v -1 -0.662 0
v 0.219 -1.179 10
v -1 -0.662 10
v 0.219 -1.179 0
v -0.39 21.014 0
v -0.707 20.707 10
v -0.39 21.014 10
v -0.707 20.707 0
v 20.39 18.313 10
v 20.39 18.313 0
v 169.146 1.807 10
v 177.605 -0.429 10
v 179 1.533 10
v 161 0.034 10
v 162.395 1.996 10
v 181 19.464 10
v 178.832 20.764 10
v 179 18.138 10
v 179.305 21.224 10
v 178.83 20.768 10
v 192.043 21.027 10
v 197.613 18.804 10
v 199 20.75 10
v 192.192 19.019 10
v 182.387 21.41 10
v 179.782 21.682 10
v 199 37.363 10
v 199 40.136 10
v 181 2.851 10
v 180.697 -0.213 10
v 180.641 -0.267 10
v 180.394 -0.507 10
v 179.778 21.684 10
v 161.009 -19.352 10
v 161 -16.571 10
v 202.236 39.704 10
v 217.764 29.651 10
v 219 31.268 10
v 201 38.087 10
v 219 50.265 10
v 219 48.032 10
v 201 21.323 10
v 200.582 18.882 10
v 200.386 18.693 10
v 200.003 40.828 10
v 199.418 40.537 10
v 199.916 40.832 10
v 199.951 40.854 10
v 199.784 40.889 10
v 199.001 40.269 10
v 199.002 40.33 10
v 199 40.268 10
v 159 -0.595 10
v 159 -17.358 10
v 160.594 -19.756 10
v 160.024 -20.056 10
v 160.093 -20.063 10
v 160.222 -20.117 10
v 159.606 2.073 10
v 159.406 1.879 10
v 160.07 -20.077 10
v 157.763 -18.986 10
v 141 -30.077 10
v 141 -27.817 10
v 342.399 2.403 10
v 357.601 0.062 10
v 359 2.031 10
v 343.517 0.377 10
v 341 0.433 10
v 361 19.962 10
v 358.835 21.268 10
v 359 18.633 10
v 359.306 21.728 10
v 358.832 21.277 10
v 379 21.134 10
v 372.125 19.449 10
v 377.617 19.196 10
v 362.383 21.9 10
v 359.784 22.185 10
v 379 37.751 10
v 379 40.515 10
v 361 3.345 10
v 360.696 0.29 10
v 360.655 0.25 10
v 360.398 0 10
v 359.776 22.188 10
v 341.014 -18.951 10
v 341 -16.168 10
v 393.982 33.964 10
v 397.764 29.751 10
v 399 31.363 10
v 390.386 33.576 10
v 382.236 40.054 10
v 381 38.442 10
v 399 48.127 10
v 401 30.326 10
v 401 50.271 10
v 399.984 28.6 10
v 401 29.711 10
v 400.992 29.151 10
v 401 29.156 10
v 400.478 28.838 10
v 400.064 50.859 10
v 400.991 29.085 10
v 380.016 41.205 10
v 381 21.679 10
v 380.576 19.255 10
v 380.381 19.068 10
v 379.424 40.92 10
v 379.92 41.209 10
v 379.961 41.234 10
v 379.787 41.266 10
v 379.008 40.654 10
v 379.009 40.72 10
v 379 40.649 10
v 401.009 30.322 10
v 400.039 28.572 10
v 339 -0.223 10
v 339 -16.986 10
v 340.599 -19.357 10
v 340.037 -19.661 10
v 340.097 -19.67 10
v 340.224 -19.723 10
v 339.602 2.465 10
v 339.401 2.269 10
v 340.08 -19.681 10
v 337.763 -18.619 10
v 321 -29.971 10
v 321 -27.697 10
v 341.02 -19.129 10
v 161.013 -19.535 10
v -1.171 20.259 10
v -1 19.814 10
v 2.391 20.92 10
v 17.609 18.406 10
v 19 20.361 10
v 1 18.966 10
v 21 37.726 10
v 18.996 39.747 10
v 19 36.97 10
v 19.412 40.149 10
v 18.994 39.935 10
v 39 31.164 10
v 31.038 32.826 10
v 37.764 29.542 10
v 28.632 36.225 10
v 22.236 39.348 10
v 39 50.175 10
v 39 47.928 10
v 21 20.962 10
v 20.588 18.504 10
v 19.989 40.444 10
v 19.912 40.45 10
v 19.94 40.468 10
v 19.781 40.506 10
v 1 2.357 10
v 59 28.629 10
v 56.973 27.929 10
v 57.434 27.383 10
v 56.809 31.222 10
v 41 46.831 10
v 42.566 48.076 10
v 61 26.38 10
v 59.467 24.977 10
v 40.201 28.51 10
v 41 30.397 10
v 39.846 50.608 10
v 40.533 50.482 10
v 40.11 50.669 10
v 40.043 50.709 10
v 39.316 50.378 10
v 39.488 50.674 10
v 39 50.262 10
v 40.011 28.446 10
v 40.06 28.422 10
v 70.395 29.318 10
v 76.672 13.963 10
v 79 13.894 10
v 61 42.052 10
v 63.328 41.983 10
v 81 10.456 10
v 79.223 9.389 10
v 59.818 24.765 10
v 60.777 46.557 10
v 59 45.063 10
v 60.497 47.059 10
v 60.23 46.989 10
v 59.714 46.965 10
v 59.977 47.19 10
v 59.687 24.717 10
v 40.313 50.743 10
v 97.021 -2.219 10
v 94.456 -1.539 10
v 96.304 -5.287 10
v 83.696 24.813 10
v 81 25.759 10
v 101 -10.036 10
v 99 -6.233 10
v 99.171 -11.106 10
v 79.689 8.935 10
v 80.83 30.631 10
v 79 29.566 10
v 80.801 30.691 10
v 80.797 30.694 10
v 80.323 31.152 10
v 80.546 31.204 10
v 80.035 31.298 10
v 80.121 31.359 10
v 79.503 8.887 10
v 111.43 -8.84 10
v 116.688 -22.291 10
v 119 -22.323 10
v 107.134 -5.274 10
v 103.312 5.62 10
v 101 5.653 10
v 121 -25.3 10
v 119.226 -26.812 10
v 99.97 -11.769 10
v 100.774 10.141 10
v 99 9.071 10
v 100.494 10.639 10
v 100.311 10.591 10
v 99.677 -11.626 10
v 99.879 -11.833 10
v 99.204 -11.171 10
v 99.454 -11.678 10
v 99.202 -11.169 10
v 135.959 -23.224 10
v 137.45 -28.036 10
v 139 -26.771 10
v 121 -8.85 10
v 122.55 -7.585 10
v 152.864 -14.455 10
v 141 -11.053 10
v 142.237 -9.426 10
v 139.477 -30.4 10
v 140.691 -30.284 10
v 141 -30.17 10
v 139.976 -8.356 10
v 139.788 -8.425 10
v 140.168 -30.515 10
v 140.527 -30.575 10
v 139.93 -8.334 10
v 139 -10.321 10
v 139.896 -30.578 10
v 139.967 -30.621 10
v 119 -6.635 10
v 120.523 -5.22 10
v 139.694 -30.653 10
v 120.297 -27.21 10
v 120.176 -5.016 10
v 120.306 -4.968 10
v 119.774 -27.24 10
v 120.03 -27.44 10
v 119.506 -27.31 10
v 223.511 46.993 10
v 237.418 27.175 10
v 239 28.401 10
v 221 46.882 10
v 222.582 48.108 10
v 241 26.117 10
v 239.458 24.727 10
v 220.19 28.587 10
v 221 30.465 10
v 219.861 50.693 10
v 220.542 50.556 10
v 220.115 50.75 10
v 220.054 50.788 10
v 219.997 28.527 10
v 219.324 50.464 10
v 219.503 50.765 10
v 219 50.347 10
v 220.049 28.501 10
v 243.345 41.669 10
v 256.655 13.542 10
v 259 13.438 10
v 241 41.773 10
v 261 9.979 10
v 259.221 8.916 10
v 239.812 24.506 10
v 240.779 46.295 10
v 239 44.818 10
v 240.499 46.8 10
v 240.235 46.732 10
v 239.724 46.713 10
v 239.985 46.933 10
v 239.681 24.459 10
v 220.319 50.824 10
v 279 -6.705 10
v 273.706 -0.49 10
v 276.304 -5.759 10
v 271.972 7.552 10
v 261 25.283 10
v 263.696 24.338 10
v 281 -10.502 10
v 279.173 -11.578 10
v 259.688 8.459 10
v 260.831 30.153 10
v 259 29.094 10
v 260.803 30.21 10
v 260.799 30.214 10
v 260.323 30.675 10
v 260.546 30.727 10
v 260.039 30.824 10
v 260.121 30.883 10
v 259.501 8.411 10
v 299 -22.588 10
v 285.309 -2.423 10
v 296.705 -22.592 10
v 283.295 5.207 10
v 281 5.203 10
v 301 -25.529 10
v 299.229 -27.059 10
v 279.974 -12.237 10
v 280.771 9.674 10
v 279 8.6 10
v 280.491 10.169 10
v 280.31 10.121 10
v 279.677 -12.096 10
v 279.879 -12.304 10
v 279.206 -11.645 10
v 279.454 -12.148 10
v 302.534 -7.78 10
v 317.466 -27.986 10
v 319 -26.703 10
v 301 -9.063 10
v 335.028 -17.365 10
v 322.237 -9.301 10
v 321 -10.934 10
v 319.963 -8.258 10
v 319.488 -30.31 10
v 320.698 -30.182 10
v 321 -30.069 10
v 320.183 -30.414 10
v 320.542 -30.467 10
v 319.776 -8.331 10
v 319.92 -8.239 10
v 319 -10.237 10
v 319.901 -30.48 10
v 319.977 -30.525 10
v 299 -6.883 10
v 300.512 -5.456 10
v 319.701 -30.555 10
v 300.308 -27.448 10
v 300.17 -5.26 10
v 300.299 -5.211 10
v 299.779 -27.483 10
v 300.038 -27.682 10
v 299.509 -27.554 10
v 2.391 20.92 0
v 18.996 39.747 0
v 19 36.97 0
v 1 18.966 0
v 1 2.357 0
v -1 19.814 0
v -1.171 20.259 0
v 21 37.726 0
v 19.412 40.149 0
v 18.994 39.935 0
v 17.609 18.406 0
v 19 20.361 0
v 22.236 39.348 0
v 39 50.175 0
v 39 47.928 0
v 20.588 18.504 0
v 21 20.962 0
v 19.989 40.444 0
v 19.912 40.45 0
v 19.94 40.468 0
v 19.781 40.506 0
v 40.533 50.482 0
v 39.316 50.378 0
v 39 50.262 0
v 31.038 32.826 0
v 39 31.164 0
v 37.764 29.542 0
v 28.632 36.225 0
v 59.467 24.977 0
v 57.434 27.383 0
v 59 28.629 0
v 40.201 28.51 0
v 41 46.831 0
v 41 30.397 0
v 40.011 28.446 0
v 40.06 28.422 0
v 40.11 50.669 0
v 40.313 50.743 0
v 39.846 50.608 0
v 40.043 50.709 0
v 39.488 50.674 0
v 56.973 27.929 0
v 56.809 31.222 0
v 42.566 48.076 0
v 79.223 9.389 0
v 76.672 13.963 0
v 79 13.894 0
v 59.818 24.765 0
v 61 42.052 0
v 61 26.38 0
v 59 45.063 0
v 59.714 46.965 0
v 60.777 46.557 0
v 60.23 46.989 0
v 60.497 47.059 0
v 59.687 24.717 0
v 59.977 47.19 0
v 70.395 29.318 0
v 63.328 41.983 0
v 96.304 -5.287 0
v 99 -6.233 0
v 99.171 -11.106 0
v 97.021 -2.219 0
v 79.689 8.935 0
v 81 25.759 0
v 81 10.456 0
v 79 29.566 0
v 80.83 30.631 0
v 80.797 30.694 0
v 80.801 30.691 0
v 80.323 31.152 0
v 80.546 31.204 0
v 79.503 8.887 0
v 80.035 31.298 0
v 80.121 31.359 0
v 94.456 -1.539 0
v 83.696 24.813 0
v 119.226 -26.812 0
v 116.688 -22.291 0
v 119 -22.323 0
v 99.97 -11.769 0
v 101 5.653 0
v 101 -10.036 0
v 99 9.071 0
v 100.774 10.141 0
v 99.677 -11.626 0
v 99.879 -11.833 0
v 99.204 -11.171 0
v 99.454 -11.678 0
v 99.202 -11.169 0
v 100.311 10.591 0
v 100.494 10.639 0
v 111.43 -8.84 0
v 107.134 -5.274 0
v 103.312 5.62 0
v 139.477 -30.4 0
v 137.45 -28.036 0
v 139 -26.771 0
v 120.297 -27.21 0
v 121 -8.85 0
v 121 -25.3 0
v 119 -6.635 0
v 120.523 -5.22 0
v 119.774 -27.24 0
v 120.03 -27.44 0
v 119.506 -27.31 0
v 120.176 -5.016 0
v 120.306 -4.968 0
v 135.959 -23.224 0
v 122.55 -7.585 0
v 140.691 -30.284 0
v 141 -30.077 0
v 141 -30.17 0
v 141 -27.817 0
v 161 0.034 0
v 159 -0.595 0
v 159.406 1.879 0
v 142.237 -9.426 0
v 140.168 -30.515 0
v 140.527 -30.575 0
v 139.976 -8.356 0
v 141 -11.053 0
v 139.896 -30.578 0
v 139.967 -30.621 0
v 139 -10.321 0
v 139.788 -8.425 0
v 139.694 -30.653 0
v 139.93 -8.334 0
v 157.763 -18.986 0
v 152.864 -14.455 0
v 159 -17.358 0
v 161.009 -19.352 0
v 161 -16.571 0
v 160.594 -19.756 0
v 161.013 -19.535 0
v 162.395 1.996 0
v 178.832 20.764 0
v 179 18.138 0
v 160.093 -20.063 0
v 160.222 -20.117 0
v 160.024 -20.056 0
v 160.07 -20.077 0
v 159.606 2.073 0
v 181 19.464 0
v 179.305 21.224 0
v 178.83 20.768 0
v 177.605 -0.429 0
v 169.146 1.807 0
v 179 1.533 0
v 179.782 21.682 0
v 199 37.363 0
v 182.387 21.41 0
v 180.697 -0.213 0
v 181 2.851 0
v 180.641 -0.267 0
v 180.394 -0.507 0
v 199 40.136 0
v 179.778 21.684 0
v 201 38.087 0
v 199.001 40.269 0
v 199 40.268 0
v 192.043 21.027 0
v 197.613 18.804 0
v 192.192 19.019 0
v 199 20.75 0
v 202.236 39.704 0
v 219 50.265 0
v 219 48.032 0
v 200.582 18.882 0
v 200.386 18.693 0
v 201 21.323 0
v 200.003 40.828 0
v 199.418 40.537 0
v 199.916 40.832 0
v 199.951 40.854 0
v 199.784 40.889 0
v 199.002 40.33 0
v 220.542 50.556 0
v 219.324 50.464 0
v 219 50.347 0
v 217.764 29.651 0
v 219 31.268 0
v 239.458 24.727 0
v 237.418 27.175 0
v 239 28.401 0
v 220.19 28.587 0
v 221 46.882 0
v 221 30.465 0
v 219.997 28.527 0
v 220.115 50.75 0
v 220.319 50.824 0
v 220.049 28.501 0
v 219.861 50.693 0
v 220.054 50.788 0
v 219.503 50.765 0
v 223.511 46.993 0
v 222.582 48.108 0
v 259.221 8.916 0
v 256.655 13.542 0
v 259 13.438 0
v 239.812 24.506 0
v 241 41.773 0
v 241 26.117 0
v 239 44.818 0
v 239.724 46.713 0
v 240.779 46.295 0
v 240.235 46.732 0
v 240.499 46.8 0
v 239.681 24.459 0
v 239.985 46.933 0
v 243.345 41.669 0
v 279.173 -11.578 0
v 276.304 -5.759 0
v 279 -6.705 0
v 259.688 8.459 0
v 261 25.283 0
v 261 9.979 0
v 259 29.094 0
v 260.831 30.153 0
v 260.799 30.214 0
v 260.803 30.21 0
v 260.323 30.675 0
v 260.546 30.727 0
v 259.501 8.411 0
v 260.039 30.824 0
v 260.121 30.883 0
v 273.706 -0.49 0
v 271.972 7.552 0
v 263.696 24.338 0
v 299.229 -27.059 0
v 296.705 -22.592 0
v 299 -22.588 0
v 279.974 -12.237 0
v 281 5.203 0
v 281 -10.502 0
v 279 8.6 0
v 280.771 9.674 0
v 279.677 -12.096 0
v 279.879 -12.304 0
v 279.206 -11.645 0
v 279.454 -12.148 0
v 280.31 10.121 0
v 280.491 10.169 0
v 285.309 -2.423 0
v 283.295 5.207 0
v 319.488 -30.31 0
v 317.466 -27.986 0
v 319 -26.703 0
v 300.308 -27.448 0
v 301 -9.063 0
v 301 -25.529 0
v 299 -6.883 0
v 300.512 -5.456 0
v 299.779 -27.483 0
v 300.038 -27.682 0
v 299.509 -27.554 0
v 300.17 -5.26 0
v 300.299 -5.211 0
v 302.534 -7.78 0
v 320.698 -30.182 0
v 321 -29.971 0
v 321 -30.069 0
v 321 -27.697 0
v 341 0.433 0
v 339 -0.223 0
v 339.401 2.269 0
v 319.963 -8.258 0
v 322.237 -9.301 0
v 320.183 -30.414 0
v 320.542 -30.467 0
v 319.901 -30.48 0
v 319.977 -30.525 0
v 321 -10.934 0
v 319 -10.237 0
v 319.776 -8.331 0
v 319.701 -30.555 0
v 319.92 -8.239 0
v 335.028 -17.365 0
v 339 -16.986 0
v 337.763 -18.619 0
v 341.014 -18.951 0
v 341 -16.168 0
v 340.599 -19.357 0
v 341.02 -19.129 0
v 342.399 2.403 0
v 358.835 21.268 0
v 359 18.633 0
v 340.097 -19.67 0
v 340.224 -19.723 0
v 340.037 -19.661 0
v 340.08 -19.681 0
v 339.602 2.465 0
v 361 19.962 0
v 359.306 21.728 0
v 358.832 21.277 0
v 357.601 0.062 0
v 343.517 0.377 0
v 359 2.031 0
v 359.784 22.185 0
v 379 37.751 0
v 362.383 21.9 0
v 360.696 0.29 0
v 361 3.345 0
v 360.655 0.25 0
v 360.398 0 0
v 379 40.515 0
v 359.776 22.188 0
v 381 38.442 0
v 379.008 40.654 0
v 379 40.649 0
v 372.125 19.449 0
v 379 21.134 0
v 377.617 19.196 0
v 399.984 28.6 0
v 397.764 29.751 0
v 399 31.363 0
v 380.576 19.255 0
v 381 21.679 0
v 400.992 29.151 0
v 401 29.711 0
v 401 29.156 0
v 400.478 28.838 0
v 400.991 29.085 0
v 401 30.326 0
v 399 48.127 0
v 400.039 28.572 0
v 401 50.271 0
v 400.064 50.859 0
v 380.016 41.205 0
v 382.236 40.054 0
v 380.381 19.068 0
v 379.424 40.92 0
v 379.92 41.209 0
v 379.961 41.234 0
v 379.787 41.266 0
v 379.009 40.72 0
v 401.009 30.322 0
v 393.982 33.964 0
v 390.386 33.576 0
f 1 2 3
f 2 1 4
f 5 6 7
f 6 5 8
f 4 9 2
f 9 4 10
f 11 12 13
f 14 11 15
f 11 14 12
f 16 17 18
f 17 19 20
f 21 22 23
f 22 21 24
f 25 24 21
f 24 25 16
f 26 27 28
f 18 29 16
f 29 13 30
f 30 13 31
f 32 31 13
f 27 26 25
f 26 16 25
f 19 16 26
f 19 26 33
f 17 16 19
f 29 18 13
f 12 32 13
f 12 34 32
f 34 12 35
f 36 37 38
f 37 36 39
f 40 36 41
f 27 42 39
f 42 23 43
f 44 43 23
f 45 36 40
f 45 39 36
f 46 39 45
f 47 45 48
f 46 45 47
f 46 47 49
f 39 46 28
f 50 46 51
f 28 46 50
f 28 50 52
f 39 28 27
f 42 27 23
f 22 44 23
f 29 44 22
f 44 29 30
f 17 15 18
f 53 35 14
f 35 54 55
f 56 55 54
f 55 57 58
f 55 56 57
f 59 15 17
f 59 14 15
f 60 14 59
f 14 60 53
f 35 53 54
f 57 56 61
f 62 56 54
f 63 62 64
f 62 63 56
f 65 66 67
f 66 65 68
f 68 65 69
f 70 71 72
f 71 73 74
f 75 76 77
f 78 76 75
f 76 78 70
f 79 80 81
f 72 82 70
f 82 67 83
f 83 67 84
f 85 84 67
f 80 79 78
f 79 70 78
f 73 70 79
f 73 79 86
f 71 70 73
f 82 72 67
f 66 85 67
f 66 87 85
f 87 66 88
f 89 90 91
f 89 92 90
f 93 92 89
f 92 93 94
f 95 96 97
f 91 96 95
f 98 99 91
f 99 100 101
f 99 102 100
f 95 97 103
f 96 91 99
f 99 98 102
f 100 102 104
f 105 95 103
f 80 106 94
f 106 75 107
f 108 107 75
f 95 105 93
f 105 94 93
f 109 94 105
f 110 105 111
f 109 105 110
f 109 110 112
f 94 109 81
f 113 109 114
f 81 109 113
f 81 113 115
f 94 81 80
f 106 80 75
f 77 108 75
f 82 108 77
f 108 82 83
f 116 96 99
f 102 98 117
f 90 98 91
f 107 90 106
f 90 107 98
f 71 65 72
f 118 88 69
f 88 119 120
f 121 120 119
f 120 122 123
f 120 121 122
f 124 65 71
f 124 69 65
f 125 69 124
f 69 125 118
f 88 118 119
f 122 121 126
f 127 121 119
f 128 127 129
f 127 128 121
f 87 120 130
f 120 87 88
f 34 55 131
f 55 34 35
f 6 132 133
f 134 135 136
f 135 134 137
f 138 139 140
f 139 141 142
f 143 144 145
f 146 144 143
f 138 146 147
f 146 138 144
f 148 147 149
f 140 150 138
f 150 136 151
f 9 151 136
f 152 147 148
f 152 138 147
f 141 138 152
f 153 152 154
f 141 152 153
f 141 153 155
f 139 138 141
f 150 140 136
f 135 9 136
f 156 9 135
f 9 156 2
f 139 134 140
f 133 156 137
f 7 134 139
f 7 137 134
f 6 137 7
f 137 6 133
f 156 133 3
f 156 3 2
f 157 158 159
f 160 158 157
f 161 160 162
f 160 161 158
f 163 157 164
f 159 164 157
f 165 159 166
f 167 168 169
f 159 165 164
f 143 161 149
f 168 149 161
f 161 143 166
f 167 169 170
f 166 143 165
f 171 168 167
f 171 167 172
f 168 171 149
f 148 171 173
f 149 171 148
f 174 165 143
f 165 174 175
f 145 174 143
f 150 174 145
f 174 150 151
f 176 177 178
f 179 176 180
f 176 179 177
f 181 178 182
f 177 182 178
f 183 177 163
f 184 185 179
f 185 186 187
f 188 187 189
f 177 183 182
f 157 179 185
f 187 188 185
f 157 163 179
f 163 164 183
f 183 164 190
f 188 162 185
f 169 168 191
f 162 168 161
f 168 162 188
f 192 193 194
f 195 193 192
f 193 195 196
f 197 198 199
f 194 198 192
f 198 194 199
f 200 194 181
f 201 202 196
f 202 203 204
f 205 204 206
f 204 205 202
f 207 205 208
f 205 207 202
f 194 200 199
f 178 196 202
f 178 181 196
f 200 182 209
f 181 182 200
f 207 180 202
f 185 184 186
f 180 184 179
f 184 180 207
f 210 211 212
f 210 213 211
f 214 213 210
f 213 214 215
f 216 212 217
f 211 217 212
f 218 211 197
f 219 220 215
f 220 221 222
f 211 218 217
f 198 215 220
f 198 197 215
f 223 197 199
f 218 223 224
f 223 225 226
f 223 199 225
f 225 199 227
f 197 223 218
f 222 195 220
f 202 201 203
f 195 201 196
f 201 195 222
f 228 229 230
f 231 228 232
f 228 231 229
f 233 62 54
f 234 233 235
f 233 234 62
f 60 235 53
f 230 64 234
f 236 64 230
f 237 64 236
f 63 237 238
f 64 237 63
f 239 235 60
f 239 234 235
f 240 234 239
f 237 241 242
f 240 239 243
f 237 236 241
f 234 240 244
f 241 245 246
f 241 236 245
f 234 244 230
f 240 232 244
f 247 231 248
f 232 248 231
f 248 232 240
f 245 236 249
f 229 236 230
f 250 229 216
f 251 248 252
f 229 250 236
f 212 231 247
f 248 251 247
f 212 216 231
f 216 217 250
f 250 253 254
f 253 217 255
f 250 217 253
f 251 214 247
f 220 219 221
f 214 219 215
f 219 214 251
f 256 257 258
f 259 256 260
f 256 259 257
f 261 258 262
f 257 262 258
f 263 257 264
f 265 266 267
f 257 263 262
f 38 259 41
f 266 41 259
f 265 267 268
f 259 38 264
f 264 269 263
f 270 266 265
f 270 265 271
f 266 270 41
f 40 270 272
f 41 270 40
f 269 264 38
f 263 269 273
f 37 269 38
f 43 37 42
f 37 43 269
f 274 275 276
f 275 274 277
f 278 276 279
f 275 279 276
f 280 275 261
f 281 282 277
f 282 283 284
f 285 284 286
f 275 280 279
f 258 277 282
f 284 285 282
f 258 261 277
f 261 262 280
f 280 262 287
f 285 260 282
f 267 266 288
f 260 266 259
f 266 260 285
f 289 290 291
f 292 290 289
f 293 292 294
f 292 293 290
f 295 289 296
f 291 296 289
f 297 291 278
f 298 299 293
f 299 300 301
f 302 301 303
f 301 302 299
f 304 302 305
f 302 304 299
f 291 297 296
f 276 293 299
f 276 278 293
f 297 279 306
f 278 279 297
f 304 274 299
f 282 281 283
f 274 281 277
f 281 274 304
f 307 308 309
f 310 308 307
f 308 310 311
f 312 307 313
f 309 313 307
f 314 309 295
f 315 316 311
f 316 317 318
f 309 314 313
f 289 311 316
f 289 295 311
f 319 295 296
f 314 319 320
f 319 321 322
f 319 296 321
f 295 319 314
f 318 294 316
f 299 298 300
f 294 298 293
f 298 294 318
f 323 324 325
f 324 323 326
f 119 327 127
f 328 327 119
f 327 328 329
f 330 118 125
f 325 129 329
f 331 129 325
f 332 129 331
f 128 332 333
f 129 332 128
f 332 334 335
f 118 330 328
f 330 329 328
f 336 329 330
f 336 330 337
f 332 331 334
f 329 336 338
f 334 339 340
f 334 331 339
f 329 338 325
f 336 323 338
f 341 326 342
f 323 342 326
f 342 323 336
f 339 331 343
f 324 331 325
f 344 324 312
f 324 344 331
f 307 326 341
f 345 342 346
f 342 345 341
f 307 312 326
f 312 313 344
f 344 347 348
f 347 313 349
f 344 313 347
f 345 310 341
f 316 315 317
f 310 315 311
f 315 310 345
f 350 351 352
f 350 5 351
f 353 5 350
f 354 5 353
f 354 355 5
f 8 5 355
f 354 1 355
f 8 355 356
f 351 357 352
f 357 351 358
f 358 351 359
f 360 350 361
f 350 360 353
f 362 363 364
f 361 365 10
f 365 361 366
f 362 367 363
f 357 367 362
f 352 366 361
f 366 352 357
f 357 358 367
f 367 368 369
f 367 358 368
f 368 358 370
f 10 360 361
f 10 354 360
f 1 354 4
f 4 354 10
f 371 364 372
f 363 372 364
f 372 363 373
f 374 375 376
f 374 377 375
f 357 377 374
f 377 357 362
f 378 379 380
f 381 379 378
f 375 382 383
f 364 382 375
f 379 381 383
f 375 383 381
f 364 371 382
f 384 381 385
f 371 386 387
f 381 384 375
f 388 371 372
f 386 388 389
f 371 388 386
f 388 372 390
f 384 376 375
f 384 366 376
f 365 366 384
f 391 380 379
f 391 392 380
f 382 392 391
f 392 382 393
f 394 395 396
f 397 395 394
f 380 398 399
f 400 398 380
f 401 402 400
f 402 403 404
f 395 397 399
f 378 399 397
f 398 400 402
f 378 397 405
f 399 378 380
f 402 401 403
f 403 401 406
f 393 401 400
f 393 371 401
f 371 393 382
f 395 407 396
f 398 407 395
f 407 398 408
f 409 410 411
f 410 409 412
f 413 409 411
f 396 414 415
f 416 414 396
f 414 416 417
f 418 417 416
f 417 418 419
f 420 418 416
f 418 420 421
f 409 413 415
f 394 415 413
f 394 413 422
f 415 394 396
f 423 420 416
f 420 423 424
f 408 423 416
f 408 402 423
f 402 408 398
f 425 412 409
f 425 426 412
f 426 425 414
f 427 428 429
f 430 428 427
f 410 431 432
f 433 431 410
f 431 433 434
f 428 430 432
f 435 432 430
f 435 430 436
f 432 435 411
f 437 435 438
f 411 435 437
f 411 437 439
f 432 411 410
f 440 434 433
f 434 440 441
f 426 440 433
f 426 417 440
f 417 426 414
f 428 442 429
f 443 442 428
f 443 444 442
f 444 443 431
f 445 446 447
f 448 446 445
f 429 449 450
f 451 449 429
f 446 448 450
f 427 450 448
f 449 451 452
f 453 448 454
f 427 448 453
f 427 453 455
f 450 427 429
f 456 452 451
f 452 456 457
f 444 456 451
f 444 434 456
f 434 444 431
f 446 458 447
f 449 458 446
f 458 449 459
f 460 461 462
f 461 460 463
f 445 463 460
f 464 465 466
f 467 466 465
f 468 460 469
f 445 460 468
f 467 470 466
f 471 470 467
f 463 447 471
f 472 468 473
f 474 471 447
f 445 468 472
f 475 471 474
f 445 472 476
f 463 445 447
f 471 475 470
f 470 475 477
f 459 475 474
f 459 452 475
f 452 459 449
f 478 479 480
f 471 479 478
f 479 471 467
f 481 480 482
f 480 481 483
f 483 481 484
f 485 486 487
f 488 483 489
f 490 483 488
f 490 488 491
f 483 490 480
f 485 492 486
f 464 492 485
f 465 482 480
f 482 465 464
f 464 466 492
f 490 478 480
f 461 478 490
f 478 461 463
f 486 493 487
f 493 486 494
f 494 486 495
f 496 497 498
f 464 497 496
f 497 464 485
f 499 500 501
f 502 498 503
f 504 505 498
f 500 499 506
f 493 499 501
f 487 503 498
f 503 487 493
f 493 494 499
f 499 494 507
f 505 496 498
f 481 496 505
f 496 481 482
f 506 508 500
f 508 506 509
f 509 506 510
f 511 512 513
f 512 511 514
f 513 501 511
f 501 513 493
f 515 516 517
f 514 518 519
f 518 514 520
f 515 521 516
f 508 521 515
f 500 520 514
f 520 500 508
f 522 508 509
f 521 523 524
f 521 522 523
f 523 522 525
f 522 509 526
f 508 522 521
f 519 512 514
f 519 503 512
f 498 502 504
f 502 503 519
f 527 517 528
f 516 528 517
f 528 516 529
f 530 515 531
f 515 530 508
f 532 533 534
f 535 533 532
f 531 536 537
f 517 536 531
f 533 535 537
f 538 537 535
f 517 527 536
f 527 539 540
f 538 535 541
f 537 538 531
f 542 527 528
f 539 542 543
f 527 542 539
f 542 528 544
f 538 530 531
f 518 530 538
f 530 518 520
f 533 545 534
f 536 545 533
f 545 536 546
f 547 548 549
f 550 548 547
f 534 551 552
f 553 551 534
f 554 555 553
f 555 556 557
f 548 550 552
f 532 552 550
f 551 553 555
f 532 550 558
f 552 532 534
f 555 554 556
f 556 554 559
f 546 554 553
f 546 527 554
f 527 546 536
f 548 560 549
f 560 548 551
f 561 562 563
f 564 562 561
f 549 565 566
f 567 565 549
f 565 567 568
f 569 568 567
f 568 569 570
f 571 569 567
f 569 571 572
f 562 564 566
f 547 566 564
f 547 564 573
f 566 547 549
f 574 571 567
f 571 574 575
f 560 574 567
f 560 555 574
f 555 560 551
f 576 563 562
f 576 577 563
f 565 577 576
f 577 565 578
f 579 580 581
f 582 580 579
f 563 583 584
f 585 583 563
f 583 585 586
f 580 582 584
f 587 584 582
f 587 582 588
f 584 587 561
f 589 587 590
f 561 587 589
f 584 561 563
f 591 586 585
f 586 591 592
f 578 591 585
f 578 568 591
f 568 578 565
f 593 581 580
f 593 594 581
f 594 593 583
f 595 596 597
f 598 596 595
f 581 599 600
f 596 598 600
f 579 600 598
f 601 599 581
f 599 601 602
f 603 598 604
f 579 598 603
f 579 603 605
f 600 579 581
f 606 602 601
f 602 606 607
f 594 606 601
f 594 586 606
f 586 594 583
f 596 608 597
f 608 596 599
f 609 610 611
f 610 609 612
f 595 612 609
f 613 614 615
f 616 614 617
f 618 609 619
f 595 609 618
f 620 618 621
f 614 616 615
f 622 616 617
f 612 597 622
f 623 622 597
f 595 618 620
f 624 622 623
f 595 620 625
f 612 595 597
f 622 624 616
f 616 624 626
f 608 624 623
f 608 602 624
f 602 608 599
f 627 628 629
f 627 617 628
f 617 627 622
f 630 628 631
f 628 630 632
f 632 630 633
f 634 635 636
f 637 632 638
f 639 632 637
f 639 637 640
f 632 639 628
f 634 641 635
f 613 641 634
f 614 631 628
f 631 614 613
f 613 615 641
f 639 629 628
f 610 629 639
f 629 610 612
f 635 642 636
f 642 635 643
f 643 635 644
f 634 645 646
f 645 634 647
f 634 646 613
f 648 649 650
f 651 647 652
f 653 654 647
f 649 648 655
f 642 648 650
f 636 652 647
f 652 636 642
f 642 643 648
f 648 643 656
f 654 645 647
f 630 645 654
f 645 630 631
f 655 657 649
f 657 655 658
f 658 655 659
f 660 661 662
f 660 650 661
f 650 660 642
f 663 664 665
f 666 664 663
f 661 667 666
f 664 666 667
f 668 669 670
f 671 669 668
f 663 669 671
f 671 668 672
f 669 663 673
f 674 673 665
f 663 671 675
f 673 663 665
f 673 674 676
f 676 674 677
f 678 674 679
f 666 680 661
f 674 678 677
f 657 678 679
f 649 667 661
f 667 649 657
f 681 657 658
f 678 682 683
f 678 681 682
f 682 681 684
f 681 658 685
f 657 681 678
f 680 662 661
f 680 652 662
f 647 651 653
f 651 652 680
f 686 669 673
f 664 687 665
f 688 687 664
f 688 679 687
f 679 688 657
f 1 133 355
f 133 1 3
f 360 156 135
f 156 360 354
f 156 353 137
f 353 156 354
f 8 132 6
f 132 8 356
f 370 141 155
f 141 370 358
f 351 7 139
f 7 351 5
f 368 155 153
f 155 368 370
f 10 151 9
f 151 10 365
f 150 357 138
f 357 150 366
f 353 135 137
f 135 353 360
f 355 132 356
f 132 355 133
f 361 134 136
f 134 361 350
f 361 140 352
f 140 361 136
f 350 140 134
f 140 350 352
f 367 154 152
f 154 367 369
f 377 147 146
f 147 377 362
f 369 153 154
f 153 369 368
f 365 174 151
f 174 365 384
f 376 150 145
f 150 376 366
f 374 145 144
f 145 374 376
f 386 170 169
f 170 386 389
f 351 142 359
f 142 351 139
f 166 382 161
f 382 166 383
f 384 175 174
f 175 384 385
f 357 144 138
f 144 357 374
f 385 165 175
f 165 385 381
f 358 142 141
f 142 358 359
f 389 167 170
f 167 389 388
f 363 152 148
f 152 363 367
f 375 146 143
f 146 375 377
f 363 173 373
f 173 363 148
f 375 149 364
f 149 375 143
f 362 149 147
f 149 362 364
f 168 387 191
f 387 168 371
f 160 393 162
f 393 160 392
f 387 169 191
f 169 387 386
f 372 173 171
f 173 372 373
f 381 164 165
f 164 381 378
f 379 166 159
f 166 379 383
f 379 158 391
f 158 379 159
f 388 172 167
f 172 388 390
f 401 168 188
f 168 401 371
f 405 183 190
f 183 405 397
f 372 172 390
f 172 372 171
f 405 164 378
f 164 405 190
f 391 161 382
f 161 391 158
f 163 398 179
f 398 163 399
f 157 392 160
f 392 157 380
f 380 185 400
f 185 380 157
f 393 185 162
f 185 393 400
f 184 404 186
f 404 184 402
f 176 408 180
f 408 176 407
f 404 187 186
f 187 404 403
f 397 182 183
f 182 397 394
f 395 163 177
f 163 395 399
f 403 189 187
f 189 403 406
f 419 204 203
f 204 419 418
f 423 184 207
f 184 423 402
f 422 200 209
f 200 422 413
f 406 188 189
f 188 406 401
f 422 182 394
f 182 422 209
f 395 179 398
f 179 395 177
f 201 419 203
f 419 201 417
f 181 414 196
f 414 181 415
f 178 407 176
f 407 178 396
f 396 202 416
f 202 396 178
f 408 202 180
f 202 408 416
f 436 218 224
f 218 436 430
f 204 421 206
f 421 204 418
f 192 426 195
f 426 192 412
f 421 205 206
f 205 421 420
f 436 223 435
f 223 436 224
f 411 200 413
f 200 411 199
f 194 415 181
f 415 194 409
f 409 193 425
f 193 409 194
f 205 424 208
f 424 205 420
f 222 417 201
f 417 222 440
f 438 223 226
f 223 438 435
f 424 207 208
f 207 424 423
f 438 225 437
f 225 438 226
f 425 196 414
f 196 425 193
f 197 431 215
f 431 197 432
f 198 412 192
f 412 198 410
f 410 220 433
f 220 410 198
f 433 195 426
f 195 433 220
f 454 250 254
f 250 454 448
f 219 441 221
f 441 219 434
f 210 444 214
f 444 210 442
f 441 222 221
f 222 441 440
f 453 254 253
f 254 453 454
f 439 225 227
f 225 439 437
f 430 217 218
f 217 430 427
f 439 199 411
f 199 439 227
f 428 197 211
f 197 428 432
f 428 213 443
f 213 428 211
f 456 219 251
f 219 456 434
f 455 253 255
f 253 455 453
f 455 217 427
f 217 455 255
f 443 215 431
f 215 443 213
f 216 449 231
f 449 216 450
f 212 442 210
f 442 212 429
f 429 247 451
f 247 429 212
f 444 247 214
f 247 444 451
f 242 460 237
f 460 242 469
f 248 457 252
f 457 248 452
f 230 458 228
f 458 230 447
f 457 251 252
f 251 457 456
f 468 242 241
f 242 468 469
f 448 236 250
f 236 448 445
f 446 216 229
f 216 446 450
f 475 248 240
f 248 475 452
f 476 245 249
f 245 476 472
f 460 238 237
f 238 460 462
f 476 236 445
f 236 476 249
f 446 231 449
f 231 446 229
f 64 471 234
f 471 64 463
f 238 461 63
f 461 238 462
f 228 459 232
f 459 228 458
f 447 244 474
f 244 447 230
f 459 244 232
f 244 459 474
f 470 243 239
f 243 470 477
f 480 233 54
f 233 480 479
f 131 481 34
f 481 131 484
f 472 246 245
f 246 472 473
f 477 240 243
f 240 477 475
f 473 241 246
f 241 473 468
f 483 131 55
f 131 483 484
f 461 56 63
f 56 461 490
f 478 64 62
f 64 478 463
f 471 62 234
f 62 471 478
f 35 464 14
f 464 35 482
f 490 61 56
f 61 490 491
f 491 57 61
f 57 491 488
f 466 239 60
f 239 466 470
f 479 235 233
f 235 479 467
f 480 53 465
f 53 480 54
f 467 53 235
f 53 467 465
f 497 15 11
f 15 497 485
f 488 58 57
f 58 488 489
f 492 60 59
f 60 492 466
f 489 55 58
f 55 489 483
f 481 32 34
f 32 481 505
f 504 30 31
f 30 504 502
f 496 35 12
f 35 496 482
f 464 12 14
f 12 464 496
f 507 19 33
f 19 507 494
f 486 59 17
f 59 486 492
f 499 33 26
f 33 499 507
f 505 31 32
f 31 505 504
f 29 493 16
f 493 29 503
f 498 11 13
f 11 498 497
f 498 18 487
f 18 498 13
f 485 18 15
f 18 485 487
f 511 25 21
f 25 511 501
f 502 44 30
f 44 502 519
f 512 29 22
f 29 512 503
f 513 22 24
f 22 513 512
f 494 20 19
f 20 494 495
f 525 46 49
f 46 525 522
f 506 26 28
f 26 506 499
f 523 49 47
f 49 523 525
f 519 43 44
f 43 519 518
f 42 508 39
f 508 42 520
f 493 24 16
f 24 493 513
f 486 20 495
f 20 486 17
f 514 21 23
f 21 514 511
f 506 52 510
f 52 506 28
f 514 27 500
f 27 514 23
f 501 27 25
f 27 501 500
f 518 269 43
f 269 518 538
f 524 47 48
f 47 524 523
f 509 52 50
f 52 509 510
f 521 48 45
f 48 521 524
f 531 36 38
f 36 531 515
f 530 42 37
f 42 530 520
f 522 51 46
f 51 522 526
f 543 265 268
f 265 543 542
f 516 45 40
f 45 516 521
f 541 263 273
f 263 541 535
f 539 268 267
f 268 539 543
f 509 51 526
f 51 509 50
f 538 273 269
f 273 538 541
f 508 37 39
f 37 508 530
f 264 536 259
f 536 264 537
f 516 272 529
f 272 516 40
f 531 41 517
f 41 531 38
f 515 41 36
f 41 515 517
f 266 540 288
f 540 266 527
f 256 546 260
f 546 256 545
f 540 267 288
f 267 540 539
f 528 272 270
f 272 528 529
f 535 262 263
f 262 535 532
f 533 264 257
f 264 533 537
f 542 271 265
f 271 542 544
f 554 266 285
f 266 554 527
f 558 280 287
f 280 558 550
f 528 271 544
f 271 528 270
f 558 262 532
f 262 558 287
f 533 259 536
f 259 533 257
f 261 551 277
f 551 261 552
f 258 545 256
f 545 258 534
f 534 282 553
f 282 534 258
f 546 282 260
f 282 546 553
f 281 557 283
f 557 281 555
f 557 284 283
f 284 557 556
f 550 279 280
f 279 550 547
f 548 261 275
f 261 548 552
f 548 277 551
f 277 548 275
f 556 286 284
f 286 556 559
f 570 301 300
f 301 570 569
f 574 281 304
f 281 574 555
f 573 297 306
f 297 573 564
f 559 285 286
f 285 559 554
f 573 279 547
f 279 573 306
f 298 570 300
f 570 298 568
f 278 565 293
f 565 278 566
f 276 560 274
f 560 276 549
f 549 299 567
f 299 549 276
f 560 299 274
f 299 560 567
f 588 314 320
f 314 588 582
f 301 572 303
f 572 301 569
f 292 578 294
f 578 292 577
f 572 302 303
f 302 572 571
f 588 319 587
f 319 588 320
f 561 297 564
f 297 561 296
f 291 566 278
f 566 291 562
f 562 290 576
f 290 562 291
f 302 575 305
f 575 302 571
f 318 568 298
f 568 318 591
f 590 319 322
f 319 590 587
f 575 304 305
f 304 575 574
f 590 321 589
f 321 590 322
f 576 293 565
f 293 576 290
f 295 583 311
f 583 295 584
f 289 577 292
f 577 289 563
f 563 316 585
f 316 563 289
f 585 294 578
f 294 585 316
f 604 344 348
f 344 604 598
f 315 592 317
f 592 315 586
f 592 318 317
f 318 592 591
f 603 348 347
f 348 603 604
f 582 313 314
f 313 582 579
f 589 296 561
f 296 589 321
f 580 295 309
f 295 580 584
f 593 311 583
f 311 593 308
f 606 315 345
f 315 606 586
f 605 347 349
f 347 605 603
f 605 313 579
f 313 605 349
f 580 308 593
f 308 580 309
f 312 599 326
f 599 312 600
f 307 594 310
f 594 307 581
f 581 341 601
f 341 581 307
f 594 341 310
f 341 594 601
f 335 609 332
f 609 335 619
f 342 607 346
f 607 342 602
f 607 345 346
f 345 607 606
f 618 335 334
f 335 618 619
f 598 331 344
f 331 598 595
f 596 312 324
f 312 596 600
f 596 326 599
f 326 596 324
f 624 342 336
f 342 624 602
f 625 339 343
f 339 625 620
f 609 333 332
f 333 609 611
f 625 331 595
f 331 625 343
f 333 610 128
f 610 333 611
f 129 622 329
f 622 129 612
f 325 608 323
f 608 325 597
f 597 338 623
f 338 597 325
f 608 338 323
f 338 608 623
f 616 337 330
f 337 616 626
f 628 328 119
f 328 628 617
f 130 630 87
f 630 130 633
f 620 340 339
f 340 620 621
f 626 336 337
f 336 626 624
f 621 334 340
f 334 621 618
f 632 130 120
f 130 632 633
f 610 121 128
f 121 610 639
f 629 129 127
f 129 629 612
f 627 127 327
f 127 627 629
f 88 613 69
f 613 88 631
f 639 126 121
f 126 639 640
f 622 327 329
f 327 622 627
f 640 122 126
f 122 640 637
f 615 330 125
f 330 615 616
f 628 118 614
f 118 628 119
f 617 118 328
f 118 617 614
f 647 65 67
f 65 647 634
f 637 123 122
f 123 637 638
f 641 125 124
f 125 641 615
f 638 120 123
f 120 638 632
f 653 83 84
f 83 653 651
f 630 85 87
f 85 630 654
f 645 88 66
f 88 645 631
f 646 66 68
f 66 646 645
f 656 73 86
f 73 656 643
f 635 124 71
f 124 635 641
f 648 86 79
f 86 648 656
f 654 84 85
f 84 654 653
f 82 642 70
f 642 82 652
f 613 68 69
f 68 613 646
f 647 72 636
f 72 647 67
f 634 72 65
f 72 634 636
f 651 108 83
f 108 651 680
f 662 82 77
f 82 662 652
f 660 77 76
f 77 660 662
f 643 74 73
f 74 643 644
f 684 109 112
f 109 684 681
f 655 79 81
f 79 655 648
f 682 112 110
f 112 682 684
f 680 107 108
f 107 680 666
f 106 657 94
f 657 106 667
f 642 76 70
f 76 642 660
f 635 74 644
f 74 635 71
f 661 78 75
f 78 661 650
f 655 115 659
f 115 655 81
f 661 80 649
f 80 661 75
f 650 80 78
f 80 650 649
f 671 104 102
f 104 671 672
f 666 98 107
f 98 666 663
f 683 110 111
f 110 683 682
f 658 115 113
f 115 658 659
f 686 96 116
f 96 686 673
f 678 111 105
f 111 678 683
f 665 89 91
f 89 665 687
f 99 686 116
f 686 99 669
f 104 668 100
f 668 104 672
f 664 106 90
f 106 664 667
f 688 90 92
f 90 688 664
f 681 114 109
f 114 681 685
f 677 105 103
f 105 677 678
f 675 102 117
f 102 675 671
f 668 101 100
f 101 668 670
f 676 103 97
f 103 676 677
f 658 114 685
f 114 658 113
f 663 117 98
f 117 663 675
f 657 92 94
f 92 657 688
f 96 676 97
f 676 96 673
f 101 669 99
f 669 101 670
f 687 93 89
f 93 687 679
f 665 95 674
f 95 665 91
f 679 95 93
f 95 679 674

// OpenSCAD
union() {
	difference() {
		linear_extrude(height = 10) {
			polygon(paths = [[0, 1, 2, 3, 4, 5]], points = [[21.1711014002, 19.0675902809], [20.6954941796, 20.3036777056], [-0.3902126499, 21.0137066045], [-1.0000000000, 20.4241072880], [-1.0000000000, -0.6620041751], [0.2188414298, -1.1791344099]]);
		}
		translate(v = [0, 0, -1]) {
			linear_extrude(height = 12) {
				polygon(paths = [[0, 1, 2]], points = [[1.0000000000, 18.9657597402], [17.6088265204, 18.4064829326], [1.0000000000, 2.3569332198]]);
			}
		}
	}
	difference() {
		linear_extrude(height = 10) {
			polygon(paths = [[0, 1, 2, 3, 4, 5]], points = [[21.0000000000, 18.9024233287], [21.0000000000, 39.9885347919], [19.7811585702, 40.5056650266], [-1.1711014002, 20.2589403358], [-0.6954941796, 19.0228529111], [20.3902126499, 18.3128240122]]);
		}
		translate(v = [0, 0, -1]) {
			linear_extrude(height = 12) {
				polygon(paths = [[0, 1, 2]], points = [[2.3911734796, 20.9200476841], [19.0000000000, 36.9695973969], [19.0000000000, 20.3607708765]]);
			}
		}
	}
	difference() {
		linear_extrude(height = 10) {
			polygon(paths = [[0, 1, 2, 3, 4, 5]], points = [[41.0058132480, 28.9549328745], [40.9940969129, 30.1910074013], [19.9404487256, 40.4683865206], [19.0000000000, 39.8809503675], [19.0000000000, 18.7658985686], [19.9565740251, 18.1809205269]]);
		}
		translate(v = [0, 0, -1]) {
			linear_extrude(height = 12) {
				polygon(paths = [[0, 1, 2]], points = [[21.0000000000, 37.7255928465], [37.7638315768, 29.5422960101], [21.0000000000, 20.9617612697]]);
			}
		}
	}
	difference() {
		linear_extrude(height = 10) {
			polygon(paths = [[0, 1, 2, 3, 4, 5]], points = [[41.0000000000, 29.0090721487], [41.0000000000, 50.1241239477], [40.0434259749, 50.7091019894], [18.9941867520, 39.9350896417], [19.0059030871, 38.6990151149], [40.0595512744, 28.4216359956]]);
		}
		translate(v = [0, 0, -1]) {
			linear_extrude(height = 12) {
				polygon(paths = [[0, 1, 2]], points = [[22.2361684232, 39.3477265062], [39.0000000000, 47.9282612465], [39.0000000000, 31.1644296697]]);
			}
		}
	}
	difference() {
		linear_extrude(height = 10) {
			polygon(paths = [[0, 1, 2, 3, 4, 5]], points = [[61.2182315821, 26.0039775828], [40.3126885709, 50.7427723543], [39.0000000000, 50.2624028618], [39.0000000000, 29.2014494087], [39.4635405871, 28.6451858156], [60.5121513270, 24.7857010788]]);
		}
		translate(v = [0, 0, -1]) {
			linear_extrude(height = 12) {
				polygon(paths = [[0, 1, 2]], points = [[41.0000000000, 30.3968029283], [41.0000000000, 46.8308275817], [57.4340246534, 27.3834512113]]);
			}
		}
	}
	difference() {
		linear_extrude(height = 10) {
			polygon(paths = [[0, 1, 2, 3, 4, 5]], points = [[61.0000000000, 25.1973700370], [61.0000000000, 46.2583234902], [60.5364594129, 46.8145870832], [39.4878486730, 50.6740718200], [38.7817684179, 49.4557953160], [59.6873114291, 24.7170005445]]);
		}
		translate(v = [0, 0, -1]) {
			linear_extrude(height = 12) {
				polygon(paths = [[0, 1, 2]], points = [[42.5659753466, 48.0763216875], [59.0000000000, 45.0629699705], [59.0000000000, 28.6289453171]]);
			}
		}
	}
	difference() {
		linear_extrude(height = 10) {
			polygon(paths = [[0, 1, 2, 3, 4, 5]], points = [[81.2733085789, 9.8198792315], [60.4965611645, 47.0587048368], [59.0000000000, 46.6694576726], [59.0000000000, 25.6672086613], [59.1994315465, 25.2547482355], [80.0225013043, 8.7559673777]]);
		}
		translate(v = [0, 0, -1]) {
			linear_extrude(height = 12) {
				polygon(paths = [[0, 1, 2]], points = [[61.0000000000, 26.3797978023], [61.0000000000, 42.0515229590], [76.6717251563, 13.9625912122]]);
			}
		}
	}
	difference() {
		linear_extrude(height = 10) {
			polygon(paths = [[0, 1, 2, 3, 4, 5]], points = [[81.0000000000, 9.2764678313], [81.0000000000, 30.2787168426], [80.8005684535, 30.6911772685], [59.9774986957, 47.1899581263], [58.7266914211, 46.1260462725], [79.5034388355, 8.8872206672]]);
		}
		translate(v = [0, 0, -1]) {
			linear_extrude(height = 12) {
				polygon(paths = [[0, 1, 2]], points = [[63.3282748437, 41.9833342917], [79.0000000000, 29.5661277017], [79.0000000000, 13.8944025449]]);
			}
		}
	}
	difference() {
		linear_extrude(height = 10) {
			polygon(paths = [[0, 1, 2, 3, 4, 5]], points = [[101.2747345241, -10.8477600841], [80.5460108127, 31.2037117574], [79.0000000000, 30.8433692884], [79.0000000000, 9.8544005924], [79.1468815878, 9.4925905033], [99.8785732789, -11.8332106606]]);
		}
		translate(v = [0, 0, -1]) {
			linear_extrude(height = 12) {
				polygon(paths = [[0, 1, 2]], points = [[81.0000000000, 10.4556077225], [81.0000000000, 25.7592514912], [96.3036437687, -5.2865935876]]);
			}
		}
	}
	difference() {
		linear_extrude(height = 10) {
			polygon(paths = [[0, 1, 2, 3, 4, 5]], points = [[101.0000000000, -11.3172216141], [101.0000000000, 9.6717470814], [100.8531184122, 10.0335571705], [80.1214267211, 31.3593583349], [78.7252654759, 30.3739077584], [99.4539891873, -11.6775640831]]);
		}
		translate(v = [0, 0, -1]) {
			linear_extrude(height = 12) {
				polygon(paths = [[0, 1, 2]], points = [[83.6963562313, 24.8127412614], [99.0000000000, 9.0705399513], [99.0000000000, -6.2331038169]]);
			}
		}
	}
	difference() {
		linear_extrude(height = 10) {
			polygon(paths = [[0, 1, 2, 3, 4, 5]], points = [[121.2730498859, -26.3721128688], [100.4939893428, 10.6393173998], [99.0000000000, 10.2486187085], [99.0000000000, -10.7543808520], [99.2024382623, -11.1694091354], [120.0300124693, -27.4396771933]]);
		}
		translate(v = [0, 0, -1]) {
			linear_extrude(height = 12) {
				polygon(paths = [[0, 1, 2]], points = [[101.0000000000, -10.0357270320], [101.0000000000, 5.6526118279], [116.6883388599, -22.2912819078]]);
			}
		}
	}
	difference() {
		linear_extrude(height = 10) {
			polygon(paths = [[0, 1, 2, 3, 4, 5]], points = [[121.0000000000, -26.9193887115], [121.0000000000, -5.9163891505], [120.7975617377, -5.5013608672], [99.9699875307, 10.7689071898], [98.7269501141, 9.7013428658], [119.5060106572, -27.3100874028]]);
		}
		translate(v = [0, 0, -1]) {
			linear_extrude(height = 12) {
				polygon(paths = [[0, 1, 2]], points = [[103.3116611401, 5.6205119053], [119.0000000000, -6.6350429705], [119.0000000000, -22.3233818309]]);
			}
		}
	}
	difference() {
		linear_extrude(height = 10) {
			polygon(paths = [[0, 1, 2, 3, 4, 5]], points = [[141.2151503554, -29.3545028293], [120.3059678958, -4.9678042461], [119.0000000000, -5.4510237188], [119.0000000000, -26.5139995124], [119.4741810714, -27.0735575035], [140.5269952463, -30.5749617736]]);
		}
		translate(v = [0, 0, -1]) {
			linear_extrude(height = 12) {
				polygon(paths = [[0, 1, 2]], points = [[121.0000000000, -25.2998523889], [121.0000000000, -8.8499123845], [137.4499400044, -28.0357284429]]);
			}
		}
	}
	difference() {
		linear_extrude(height = 10) {
			polygon(paths = [[0, 1, 2, 3, 4, 5]], points = [[141.0000000000, -30.1698278319], [141.0000000000, -9.1068520383], [140.5258189286, -8.5472940472], [119.4730047537, -5.0458897771], [118.7848496446, -6.2663487215], [139.6940321042, -30.6530473046]]);
		}
		translate(v = [0, 0, -1]) {
			linear_extrude(height = 12) {
				polygon(paths = [[0, 1, 2]], points = [[122.5500599956, -7.5851231078], [139.0000000000, -10.3209991618], [139.0000000000, -26.7709391662]]);
			}
		}
	}
	difference() {
		linear_extrude(height = 10) {
			polygon(paths = [[0, 1, 2, 3, 4, 5]], points = [[161.0130126732, -19.5346290902], [160.9865284273, -18.2985277595], [139.9301816747, -8.3342214958], [139.0000000000, -8.9231161140], [139.0000000000, -30.0380807156], [139.9666242716, -30.6214237292]]);
		}
		translate(v = [0, 0, -1]) {
			linear_extrude(height = 12) {
				polygon(paths = [[0, 1, 2]], points = [[141.0000000000, -11.0531167989], [157.7634188985, -18.9859192879], [141.0000000000, -27.8165356973]]);
			}
		}
	}
	difference() {
		linear_extrude(height = 10) {
			polygon(paths = [[0, 1, 2, 3, 4, 5]], points = [[161.0000000000, -19.4884614004], [161.0000000000, 1.6265032007], [160.0333757284, 2.2098462144], [138.9869873268, -8.8769484241], [139.0134715727, -10.1130497549], [160.0698183253, -20.0773560186]]);
		}
		translate(v = [0, 0, -1]) {
			linear_extrude(height = 12) {
				polygon(paths = [[0, 1, 2]], points = [[142.2365811015, -9.4256582265], [159.0000000000, -0.5950418175], [159.0000000000, -17.3584607155]]);
			}
		}
	}
	difference() {
		linear_extrude(height = 10) {
			polygon(paths = [[0, 1, 2, 3, 4, 5]], points = [[181.1725924504, 0.2496792027], [180.6908335132, 1.4855456832], [159.6056315871, 2.0733840857], [159.0000000000, 1.4844017010], [159.0000000000, -19.6010780986], [160.2215926638, -20.1172236279]]);
		}
		translate(v = [0, 0, -1]) {
			linear_extrude(height = 12) {
				polygon(paths = [[0, 1, 2]], points = [[161.0000000000, 0.0337331221], [177.6049721194, -0.4292000914], [161.0000000000, -16.5712389969]]);
			}
		}
	}
	difference() {
		linear_extrude(height = 10) {
			polygon(paths = [[0, 1, 2, 3, 4, 5]], points = [[181.0000000000, 0.0820161770], [181.0000000000, 21.1674959771], [179.7784073362, 21.6836415064], [158.8274075496, 1.3167386753], [159.3091664868, 0.0808721948], [180.3943684129, -0.5069662076]]);
		}
		translate(v = [0, 0, -1]) {
			linear_extrude(height = 12) {
				polygon(paths = [[0, 1, 2]], points = [[162.3950278806, 1.9956179694], [179.0000000000, 18.1376568754], [179.0000000000, 1.5326847560]]);
			}
		}
	}
	difference() {
		linear_extrude(height = 10) {
			polygon(paths = [[0, 1, 2, 3, 4, 5]], points = [[201.1695256284, 19.4462482403], [200.7003562306, 20.6825544978], [179.6141497972, 21.5205404293], [179.0000000000, 20.9303127448], [179.0000000000, -0.1564561529], [180.2159452294, -0.6746169128]]);
		}
		translate(v = [0, 0, -1]) {
			linear_extrude(height = 12) {
				polygon(paths = [[0, 1, 2]], points = [[181.0000000000, 19.4638867015], [197.6128133526, 18.8036776730], [181.0000000000, 2.8510733489]]);
			}
		}
	}
	difference() {
		linear_extrude(height = 10) {
			polygon(paths = [[0, 1, 2, 3, 4, 5]], points = [[201.0000000000, 19.2837022310], [201.0000000000, 40.3704711287], [199.7840547706, 40.8886318887], [178.8304743716, 20.7677667355], [179.2996437694, 19.5314604780], [200.3858502028, 18.6934745465]]);
		}
		translate(v = [0, 0, -1]) {
			linear_extrude(height = 12) {
				polygon(paths = [[0, 1, 2]], points = [[182.3871866474, 21.4103373028], [199.0000000000, 37.3629416269], [199.0000000000, 20.7501282743]]);
			}
		}
	}
	difference() {
		linear_extrude(height = 10) {
			polygon(paths = [[0, 1, 2, 3, 4, 5]], points = [[220.9984008763, 29.0244307504], [221.0015924568, 30.2604992143], [199.9507322251, 40.8538719770], [199.0000000000, 40.2679798524], [199.0000000000, 19.1529083964], [199.9463394079, 18.5663465401]]);
		}
		translate(v = [0, 0, -1]) {
			linear_extrude(height = 12) {
				polygon(paths = [[0, 1, 2]], points = [[201.0000000000, 38.0868893005], [217.7639245689, 29.6508206567], [201.0000000000, 21.3229647316]]);
			}
		}
	}
	difference() {
		linear_extrude(height = 10) {
			polygon(paths = [[0, 1, 2, 3, 4, 5]], points = [[221.0000000000, 29.0866651251], [221.0000000000, 50.2017365810], [220.0536605921, 50.7882984374], [199.0015991237, 40.3302142271], [198.9984075432, 39.0941457632], [220.0492677749, 28.5007730005]]);
		}
		translate(v = [0, 0, -1]) {
			linear_extrude(height = 12) {
				polygon(paths = [[0, 1, 2]], points = [[202.2360754311, 39.7038243208], [219.0000000000, 48.0316802459], [219.0000000000, 31.2677556770]]);
			}
		}
	}
	difference() {
		linear_extrude(height = 10) {
			polygon(paths = [[0, 1, 2, 3, 4, 5]], points = [[241.2212037477, 25.7344123460], [220.3192858626, 50.8241128507], [219.0000000000, 50.3465737114], [219.0000000000, 29.2876322111], [219.4530999614, 28.7347472357], [240.4973219046, 24.5184534304]]);
		}
		translate(v = [0, 0, -1]) {
			linear_extrude(height = 12) {
				polygon(paths = [[0, 1, 2]], points = [[221.0000000000, 30.4645664119], [221.0000000000, 46.8823711341], [237.4178047222, 27.1751937508]]);
			}
		}
	}
	difference() {
		linear_extrude(height = 10) {
			polygon(paths = [[0, 1, 2, 3, 4, 5]], points = [[241.0000000000, 24.9364405470], [241.0000000000, 45.9953820473], [240.5469000386, 46.5482670227], [219.5026780954, 50.7645608280], [218.7787962523, 49.5486019123], [239.6807141374, 24.4589014077]]);
		}
		translate(v = [0, 0, -1]) {
			linear_extrude(height = 12) {
				polygon(paths = [[0, 1, 2]], points = [[222.5821952778, 48.1078205076], [239.0000000000, 44.8184478465], [239.0000000000, 28.4006431242]]);
			}
		}
	}
	difference() {
		linear_extrude(height = 10) {
			polygon(paths = [[0, 1, 2, 3, 4, 5]], points = [[261.2735428428, 9.3384020561], [240.4990585870, 46.8000077964], [239.0000000000, 46.4121750453], [239.0000000000, 25.4106498421], [239.1965371012, 25.0006913440], [260.0152054611, 8.2780789416]]);
		}
		translate(v = [0, 0, -1]) {
			linear_extrude(height = 12) {
				polygon(paths = [[0, 1, 2]], points = [[241.0000000000, 26.1173745538], [241.0000000000, 41.7727480642], [256.6553735109, 13.5421829657]]);
			}
		}
	}
	difference() {
		linear_extrude(height = 10) {
			polygon(paths = [[0, 1, 2, 3, 4, 5]], points = [[261.0000000000, 8.7987430673], [261.0000000000, 29.8002682705], [260.8034628988, 30.2102267686], [239.9847945389, 46.9328391710], [238.7264571572, 45.8725160565], [259.5009414130, 8.4109103163]]);
		}
		translate(v = [0, 0, -1]) {
			linear_extrude(height = 12) {
				polygon(paths = [[0, 1, 2]], points = [[243.3446264891, 41.6687351470], [259.0000000000, 29.0935435588], [259.0000000000, 13.4381700484]]);
			}
		}
	}
	difference() {
		linear_extrude(height = 10) {
			polygon(paths = [[0, 1, 2, 3, 4, 5]], points = [[281.2747368049, -11.3185318820], [260.5459554377, 30.7270283857], [259.0000000000, 30.3666524841], [259.0000000000, 9.3776702788], [259.1469347528, 9.0158026014], [279.8787329099, -12.3040786637]]);
		}
		translate(v = [0, 0, -1]) {
			linear_extrude(height = 12) {
				polygon(paths = [[0, 1, 2]], points = [[261.0000000000, 9.9789963998], [261.0000000000, 25.2831095406], [276.3041131408, -5.7592368471]]);
			}
		}
	}
	difference() {
		linear_extrude(height = 10) {
			polygon(paths = [[0, 1, 2, 3, 4, 5]], points = [[281.0000000000, -11.7880754913], [281.0000000000, 9.2009067135], [280.8530652472, 9.5627743909], [260.1212670901, 30.8826556564], [258.7252631951, 29.8971088747], [279.4540445623, -12.1484513930]]);
		}
		translate(v = [0, 0, -1]) {
			linear_extrude(height = 12) {
				polygon(paths = [[0, 1, 2]], points = [[263.6958868597, 24.3378138398], [279.0000000000, 8.5995805925], [279.0000000000, -6.7045325479]]);
			}
		}
	}
	difference() {
		linear_extrude(height = 10) {
			polygon(paths = [[0, 1, 2, 3, 4, 5]], points = [[301.2727652285, -26.6106433440], [280.4913421585, 10.1688376195], [279.0000000000, 9.7766501843], [279.0000000000, -11.2271272833], [279.2055605249, -11.6447891821], [300.0377407889, -27.6819212302]]);
		}
		translate(v = [0, 0, -1]) {
			linear_extrude(height = 12) {
				polygon(paths = [[0, 1, 2]], points = [[281.0000000000, -10.5022041933], [281.0000000000, 5.2030000691], [296.7052042624, -22.5924622174]]);
			}
		}
	}
	difference() {
		linear_extrude(height = 10) {
			polygon(paths = [[0, 1, 2, 3, 4, 5]], points = [[301.0000000000, -27.1618968612], [301.0000000000, -6.1581193930], [300.7944394751, -5.7404574943], [279.9622592111, 10.2966745533], [278.7272347715, 9.2253966671], [299.5086578415, -27.5540842963]]);
		}
		translate(v = [0, 0, -1]) {
			linear_extrude(height = 12) {
				polygon(paths = [[0, 1, 2]], points = [[283.2947957376, 5.2072155410], [299.0000000000, -6.8830424831], [299.0000000000, -22.5882467460]]);
			}
		}
	}
	difference() {
		linear_extrude(height = 10) {
			polygon(paths = [[0, 1, 2, 3, 4, 5]], points = [[321.2119588437, -29.2447540094], [300.2991232001, -5.2112432588], [299.0000000000, -5.6973307738], [299.0000000000, -26.7623363277], [299.4850156535, -27.3250977588], [320.5418391218, -30.4672591542]]);
		}
		translate(v = [0, 0, -1]) {
			linear_extrude(height = 12) {
				polygon(paths = [[0, 1, 2]], points = [[301.0000000000, -25.5290233069], [301.0000000000, -9.0634845397], [317.4655387672, -27.9860596377]]);
			}
		}
	}
	difference() {
		linear_extrude(height = 10) {
			polygon(paths = [[0, 1, 2, 3, 4, 5]], points = [[321.0000000000, -30.0688738995], [321.0000000000, -9.0038683456], [320.5149843465, -8.4411069145], [299.4581608782, -5.2989455191], [298.7880411563, -6.5214506639], [319.7008767999, -30.5549614145]]);
		}
		translate(v = [0, 0, -1]) {
			linear_extrude(height = 12) {
				polygon(paths = [[0, 1, 2]], points = [[302.5344612328, -7.7801450356], [319.0000000000, -10.2371813664], [319.0000000000, -26.7027201336]]);
			}
		}
	}
	difference() {
		linear_extrude(height = 10) {
			polygon(paths = [[0, 1, 2, 3, 4, 5]], points = [[341.0200032685, -19.1289477660], [340.9788915589, -17.8927998804], [319.9199390239, -8.2385531678], [319.0000000000, -8.8288196712], [319.0000000000, -29.9436316844], [319.9764876724, -30.5252935453]]);
		}
		translate(v = [0, 0, -1]) {
			linear_extrude(height = 12) {
				polygon(paths = [[0, 1, 2]], points = [[321.0000000000, -10.9338465761], [337.7626960594, -18.6185214459], [321.0000000000, -27.6965426360]]);
			}
		}
	}
	difference() {
		linear_extrude(height = 10) {
			polygon(paths = [[0, 1, 2, 3, 4, 5]], points = [[341.0000000000, -19.0906255702], [341.0000000000, 2.0241864426], [340.0235123276, 2.6058483035], [318.9799967315, -8.7904974753], [319.0211084411, -10.0266453610], [340.0800609761, -19.6808920735]]);
		}
		translate(v = [0, 0, -1]) {
			linear_extrude(height = 12) {
				polygon(paths = [[0, 1, 2]], points = [[322.2373039406, -9.3009237954], [339.0000000000, -0.2229026058], [339.0000000000, -16.9855986652]]);
			}
		}
	}
	difference() {
		linear_extrude(height = 10) {
			polygon(paths = [[0, 1, 2, 3, 4, 5]], points = [[361.1740003196, 0.7579491688], [360.6863782541, 1.9935941114], [339.6016825633, 2.4650428635], [339.0000000000, 1.8766633887], [339.0000000000, -19.2082113456], [340.2242002208, -19.7234184104]]);
		}
		translate(v = [0, 0, -1]) {
			linear_extrude(height = 12) {
				polygon(paths = [[0, 1, 2]], points = [[341.0000000000, 0.4332769238], [357.6012578504, 0.0620767693], [341.0000000000, -16.1679809261]]);
			}
		}
	}
	difference() {
		linear_extrude(height = 10) {
			polygon(paths = [[0, 1, 2, 3, 4, 5]], points = [[361.0000000000, 0.5879146606], [361.0000000000, 21.6727893953], [359.7757997792, 22.1879964601], [338.8259996804, 1.7066288805], [339.3136217459, 0.4709839378], [360.3983174367, -0.0004648142]]);
		}
		translate(v = [0, 0, -1]) {
			linear_extrude(height = 12) {
				polygon(paths = [[0, 1, 2]], points = [[342.3987421496, 2.4025012800], [359.0000000000, 18.6325589758], [359.0000000000, 2.0313011254]]);
			}
		}
	}
	difference() {
		linear_extrude(height = 10) {
			polygon(paths = [[0, 1, 2, 3, 4, 5]], points = [[381.1678635227, 19.8191270293], [380.7054154067, 21.0556484917], [359.6187187708, 22.0273219449], [359.0000000000, 21.4364571571], [359.0000000000, 0.3490059432], [360.2129027178, -0.1702306997]]);
		}
		translate(v = [0, 0, -1]) {
			linear_extrude(height = 12) {
				polygon(paths = [[0, 1, 2]], points = [[361.0000000000, 19.9615503722], [377.6169245909, 19.1958436910], [361.0000000000, 3.3446257813]]);
			}
		}
	}
	difference() {
		linear_extrude(height = 10) {
			polygon(paths = [[0, 1, 2, 3, 4, 5]], points = [[381.0000000000, 19.6593271252], [381.0000000000, 40.7467783391], [379.7870972822, 41.2660149820], [358.8321364773, 21.2766572530], [359.2945845933, 20.0401357906], [380.3812812292, 19.0684623374]]);
		}
		translate(v = [0, 0, -1]) {
			linear_extrude(height = 12) {
				polygon(paths = [[0, 1, 2]], points = [[362.3830754091, 21.8999405913], [379.0000000000, 37.7511585010], [379.0000000000, 21.1342339101]]);
			}
		}
	}
	difference() {
		linear_extrude(height = 10) {
			polygon(paths = [[0, 1, 2, 3, 4, 5]], points = [[400.9907715172, 29.0854246709], [401.0090107881, 30.3215085012], [379.9610243049, 41.2337025916], [379.0000000000, 40.6494388166], [379.0000000000, 19.5344172306], [379.9359233179, 18.9463279750]]);
		}
		translate(v = [0, 0, -1]) {
			linear_extrude(height = 12) {
				polygon(paths = [[0, 1, 2]], points = [[381.0000000000, 38.4422462299], [397.7636886188, 29.7512189895], [381.0000000000, 21.6785576111]]);
			}
		}
	}
	difference() {
		linear_extrude(height = 10) {
			polygon(paths = [[0, 1, 2, 3, 4, 5]], points = [[401.0000000000, 29.1558747198], [401.0000000000, 50.2708963058], [400.0640766821, 50.8589855614], [379.0092284828, 40.7198888655], [378.9909892119, 39.4838050352], [400.0389756951, 28.5716109448]]);
		}
		translate(v = [0, 0, -1]) {
			linear_extrude(height = 12) {
				polygon(paths = [[0, 1, 2]], points = [[382.2363113812, 40.0540945469], [399.0000000000, 48.1267559254], [399.0000000000, 31.3630673066]]);
			}
		}
	}
}
